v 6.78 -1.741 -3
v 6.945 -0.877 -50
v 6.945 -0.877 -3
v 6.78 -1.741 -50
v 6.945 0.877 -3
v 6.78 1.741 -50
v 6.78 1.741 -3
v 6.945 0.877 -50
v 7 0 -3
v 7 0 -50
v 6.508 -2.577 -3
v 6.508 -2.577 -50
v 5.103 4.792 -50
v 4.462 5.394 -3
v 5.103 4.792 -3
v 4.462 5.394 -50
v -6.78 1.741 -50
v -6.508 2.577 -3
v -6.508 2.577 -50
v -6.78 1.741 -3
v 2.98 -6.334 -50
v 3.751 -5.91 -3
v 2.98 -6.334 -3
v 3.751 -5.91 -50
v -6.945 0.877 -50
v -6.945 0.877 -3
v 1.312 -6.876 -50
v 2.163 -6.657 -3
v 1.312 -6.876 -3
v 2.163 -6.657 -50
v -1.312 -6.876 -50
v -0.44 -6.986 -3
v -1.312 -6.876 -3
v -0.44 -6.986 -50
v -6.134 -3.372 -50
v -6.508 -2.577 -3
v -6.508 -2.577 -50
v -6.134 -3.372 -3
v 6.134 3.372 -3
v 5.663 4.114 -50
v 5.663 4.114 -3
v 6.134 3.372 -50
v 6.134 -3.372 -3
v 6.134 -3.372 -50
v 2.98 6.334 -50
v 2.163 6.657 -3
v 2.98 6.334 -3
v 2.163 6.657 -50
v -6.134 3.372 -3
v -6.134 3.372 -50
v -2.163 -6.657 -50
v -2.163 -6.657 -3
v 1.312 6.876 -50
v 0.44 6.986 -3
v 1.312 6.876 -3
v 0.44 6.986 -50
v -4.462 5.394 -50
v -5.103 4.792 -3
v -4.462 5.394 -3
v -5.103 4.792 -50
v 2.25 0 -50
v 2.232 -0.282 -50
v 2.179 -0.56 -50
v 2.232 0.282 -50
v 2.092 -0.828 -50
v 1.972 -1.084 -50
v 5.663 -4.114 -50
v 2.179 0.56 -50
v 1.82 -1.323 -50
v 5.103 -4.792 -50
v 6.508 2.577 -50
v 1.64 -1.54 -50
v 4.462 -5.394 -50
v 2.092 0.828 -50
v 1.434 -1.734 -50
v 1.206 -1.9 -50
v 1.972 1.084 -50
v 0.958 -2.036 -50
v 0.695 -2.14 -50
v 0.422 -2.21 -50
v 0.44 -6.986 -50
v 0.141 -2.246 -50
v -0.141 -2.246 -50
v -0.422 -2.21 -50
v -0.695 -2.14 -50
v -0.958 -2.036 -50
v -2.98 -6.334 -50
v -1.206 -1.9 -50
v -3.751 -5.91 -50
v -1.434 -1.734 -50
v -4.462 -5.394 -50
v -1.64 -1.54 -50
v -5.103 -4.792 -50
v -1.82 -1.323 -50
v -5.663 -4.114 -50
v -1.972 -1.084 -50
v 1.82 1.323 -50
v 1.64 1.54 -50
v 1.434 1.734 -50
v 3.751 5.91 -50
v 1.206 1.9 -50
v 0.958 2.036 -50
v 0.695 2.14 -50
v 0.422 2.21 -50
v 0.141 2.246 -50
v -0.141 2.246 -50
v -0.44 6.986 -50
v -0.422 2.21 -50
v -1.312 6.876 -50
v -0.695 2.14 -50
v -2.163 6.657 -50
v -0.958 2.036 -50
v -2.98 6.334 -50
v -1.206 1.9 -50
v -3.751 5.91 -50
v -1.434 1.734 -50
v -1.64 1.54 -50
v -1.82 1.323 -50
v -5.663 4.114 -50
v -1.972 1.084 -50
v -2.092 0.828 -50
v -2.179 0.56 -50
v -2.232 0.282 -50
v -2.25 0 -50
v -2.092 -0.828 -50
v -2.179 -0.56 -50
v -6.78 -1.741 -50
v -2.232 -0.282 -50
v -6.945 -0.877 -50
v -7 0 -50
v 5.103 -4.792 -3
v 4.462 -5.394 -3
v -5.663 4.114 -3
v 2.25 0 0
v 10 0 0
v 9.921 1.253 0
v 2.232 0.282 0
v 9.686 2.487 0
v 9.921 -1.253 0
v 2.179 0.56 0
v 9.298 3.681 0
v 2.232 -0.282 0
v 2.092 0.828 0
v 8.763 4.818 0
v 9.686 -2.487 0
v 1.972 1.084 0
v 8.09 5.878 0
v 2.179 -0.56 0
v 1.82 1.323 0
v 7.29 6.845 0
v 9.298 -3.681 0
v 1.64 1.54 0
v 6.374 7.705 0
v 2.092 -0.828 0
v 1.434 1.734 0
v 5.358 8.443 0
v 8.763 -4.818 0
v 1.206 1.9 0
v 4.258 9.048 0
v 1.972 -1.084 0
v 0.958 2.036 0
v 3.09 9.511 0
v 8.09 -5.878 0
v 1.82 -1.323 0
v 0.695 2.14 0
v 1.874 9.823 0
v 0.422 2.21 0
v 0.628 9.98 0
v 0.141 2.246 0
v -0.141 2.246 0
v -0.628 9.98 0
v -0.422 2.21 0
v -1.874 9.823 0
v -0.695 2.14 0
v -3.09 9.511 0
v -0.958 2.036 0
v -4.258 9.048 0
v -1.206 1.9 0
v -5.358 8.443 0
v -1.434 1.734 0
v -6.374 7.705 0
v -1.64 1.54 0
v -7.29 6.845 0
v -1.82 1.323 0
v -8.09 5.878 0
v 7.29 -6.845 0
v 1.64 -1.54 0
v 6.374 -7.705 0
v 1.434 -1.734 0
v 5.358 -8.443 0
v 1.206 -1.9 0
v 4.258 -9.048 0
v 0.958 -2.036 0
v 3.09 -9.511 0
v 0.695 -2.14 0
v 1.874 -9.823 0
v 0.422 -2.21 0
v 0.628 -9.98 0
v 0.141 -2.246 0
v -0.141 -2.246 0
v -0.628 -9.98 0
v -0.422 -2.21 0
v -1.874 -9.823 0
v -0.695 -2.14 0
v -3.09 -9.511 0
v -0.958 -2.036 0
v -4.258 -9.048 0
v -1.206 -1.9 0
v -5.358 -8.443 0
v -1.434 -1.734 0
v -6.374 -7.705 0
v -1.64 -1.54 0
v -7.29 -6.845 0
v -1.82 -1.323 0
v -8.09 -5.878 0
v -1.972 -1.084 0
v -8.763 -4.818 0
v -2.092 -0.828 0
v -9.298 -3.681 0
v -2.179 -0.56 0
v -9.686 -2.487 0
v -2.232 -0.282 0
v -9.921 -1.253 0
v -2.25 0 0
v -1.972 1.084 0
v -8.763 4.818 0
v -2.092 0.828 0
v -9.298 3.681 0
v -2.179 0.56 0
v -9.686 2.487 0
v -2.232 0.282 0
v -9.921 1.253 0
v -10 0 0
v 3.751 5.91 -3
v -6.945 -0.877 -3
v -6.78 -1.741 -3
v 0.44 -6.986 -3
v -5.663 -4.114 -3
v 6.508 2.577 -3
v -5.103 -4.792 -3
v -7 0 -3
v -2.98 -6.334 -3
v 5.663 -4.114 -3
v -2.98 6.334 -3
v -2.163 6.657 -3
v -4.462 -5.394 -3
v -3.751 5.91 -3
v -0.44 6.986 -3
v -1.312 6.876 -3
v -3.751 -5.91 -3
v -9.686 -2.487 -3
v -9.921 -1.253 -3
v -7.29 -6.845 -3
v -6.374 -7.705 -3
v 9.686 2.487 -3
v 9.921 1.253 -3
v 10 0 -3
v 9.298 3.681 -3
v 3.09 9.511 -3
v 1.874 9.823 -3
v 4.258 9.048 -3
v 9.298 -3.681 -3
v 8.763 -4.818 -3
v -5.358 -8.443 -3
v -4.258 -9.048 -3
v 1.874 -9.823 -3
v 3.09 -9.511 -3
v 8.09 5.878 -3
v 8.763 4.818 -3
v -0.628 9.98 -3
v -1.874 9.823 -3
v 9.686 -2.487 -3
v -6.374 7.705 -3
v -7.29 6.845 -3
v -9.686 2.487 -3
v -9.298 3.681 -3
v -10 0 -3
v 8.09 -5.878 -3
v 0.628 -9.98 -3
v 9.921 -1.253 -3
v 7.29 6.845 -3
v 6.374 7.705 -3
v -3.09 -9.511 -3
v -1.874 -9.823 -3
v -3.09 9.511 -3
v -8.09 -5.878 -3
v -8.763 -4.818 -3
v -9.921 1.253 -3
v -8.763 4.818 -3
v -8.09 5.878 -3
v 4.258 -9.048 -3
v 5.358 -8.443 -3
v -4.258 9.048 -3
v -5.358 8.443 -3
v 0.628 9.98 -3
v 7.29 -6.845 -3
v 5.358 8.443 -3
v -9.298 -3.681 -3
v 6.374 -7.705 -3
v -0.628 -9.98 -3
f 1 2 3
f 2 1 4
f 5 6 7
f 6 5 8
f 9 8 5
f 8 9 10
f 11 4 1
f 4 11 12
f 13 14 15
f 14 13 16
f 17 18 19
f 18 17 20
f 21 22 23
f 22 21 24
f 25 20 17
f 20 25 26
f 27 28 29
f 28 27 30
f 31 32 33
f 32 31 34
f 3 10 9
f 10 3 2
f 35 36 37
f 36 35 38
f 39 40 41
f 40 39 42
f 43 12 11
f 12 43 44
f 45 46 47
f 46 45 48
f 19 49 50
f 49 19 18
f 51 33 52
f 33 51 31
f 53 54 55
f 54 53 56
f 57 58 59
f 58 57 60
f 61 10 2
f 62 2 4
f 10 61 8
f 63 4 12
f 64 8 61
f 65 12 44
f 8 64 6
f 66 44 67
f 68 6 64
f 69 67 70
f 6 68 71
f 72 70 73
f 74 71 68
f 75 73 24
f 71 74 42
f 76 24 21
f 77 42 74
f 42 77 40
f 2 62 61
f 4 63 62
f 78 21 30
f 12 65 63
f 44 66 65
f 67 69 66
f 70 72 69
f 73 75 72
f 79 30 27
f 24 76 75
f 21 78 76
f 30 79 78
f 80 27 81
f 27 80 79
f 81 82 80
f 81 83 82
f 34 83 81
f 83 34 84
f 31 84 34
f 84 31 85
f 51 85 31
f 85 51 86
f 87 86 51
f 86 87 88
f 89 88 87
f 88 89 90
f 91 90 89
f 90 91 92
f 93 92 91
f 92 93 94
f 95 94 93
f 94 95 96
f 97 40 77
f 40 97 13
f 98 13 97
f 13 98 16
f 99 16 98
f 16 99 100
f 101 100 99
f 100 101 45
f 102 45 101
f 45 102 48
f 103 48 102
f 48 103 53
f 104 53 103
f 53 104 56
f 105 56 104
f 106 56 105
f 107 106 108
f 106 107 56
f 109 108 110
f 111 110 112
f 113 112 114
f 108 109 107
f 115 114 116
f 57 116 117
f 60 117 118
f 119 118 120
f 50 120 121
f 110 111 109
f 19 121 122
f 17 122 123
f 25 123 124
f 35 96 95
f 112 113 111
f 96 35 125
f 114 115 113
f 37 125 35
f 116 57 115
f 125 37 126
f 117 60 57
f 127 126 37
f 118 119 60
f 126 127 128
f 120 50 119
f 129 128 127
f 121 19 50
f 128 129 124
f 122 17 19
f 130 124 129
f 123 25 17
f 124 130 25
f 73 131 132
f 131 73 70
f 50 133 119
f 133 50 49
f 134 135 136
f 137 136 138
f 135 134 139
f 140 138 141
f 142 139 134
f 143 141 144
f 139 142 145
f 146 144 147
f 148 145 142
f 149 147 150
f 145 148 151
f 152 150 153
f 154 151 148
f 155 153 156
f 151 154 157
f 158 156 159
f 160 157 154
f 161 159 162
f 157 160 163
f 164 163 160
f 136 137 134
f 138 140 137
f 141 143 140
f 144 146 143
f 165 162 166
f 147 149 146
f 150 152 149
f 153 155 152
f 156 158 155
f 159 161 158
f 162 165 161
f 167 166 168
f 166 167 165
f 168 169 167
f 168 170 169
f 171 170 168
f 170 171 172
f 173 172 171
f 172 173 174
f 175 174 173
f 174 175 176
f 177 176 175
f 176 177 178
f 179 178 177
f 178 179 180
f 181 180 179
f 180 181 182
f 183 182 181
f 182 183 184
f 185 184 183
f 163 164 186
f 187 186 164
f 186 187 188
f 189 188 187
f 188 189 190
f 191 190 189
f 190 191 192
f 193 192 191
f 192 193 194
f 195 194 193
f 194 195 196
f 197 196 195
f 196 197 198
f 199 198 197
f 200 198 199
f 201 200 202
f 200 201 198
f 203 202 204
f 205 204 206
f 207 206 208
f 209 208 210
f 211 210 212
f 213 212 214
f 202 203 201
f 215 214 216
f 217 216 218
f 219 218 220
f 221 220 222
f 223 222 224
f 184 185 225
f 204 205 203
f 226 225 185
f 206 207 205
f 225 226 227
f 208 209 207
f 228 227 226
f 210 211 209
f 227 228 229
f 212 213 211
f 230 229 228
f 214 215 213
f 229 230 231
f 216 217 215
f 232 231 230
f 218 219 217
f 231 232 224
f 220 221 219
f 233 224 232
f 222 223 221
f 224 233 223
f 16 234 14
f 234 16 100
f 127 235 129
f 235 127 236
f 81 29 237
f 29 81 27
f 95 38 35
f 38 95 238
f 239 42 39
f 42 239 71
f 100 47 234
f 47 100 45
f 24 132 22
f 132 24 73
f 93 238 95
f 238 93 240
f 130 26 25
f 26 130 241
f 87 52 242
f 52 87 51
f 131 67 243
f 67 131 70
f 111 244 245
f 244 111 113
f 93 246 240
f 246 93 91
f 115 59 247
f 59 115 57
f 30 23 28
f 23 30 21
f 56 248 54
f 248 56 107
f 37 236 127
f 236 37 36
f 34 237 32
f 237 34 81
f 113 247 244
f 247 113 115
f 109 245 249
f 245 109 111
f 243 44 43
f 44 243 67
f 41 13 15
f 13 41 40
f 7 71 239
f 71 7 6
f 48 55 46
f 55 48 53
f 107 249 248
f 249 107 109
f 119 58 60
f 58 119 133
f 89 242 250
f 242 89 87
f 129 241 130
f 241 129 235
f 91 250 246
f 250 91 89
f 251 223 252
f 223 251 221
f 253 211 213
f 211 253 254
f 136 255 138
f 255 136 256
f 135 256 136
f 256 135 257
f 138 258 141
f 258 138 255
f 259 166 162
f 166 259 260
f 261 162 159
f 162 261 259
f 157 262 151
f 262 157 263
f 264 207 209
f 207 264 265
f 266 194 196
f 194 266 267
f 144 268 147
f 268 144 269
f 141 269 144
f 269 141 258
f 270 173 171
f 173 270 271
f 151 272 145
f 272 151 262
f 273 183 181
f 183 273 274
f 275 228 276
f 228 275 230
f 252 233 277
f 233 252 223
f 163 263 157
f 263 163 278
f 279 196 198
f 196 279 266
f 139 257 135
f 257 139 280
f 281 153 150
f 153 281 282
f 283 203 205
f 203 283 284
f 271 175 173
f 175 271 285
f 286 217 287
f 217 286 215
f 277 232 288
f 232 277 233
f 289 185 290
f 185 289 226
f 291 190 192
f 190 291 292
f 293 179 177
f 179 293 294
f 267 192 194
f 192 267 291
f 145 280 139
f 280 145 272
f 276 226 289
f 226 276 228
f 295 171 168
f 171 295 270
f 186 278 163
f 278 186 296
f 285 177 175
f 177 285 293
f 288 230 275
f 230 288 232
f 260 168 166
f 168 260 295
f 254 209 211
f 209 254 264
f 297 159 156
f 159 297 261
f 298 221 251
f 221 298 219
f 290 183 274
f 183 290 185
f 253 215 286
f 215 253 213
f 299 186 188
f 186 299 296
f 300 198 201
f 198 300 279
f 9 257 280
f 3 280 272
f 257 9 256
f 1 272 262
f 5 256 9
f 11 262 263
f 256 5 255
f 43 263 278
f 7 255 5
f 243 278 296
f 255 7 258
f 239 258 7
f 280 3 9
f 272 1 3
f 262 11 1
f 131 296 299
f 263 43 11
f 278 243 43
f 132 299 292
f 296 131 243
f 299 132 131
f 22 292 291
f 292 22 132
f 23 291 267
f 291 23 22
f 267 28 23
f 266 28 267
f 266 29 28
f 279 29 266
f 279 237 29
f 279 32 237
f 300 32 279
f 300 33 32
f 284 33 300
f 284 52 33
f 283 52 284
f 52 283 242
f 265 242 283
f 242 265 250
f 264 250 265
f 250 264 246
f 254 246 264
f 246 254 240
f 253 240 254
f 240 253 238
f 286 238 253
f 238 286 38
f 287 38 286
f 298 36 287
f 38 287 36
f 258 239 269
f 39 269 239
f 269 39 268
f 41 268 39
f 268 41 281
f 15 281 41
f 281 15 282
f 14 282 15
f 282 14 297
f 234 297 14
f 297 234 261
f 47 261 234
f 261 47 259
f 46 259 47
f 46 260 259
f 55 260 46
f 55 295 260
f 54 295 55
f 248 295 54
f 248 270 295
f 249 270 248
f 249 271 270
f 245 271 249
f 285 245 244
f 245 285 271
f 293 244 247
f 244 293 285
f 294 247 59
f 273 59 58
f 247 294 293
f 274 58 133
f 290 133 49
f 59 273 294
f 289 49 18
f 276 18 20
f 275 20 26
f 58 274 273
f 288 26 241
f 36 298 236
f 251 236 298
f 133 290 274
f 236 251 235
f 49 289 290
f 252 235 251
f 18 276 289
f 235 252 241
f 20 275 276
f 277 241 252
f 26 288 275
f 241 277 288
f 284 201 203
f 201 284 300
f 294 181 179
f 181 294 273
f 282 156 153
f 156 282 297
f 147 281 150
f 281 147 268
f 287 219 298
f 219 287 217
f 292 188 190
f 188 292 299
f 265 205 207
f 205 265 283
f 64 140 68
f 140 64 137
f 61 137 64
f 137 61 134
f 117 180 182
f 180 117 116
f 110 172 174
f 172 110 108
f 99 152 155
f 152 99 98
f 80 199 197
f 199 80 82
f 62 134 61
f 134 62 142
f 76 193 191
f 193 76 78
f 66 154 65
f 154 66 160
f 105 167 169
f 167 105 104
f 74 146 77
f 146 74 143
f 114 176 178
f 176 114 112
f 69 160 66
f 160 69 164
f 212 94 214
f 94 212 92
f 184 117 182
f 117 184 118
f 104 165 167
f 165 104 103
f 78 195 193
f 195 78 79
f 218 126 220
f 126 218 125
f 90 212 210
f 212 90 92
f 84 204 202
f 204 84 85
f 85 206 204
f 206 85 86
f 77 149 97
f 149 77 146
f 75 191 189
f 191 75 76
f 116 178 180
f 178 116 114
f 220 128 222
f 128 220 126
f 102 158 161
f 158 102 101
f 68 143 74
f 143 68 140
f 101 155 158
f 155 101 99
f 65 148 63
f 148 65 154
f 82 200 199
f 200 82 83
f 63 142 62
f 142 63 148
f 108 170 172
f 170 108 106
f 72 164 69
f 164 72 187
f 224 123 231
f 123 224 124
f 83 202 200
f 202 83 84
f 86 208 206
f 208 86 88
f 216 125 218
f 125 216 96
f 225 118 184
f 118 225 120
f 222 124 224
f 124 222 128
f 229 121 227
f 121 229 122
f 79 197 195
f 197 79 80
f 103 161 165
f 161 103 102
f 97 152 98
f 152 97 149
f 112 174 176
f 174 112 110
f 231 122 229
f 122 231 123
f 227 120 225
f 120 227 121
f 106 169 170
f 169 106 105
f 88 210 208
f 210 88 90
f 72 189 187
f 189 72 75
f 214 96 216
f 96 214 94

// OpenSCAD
$fn = 50;


difference() {
	union() {
		translate(v = [0, 0, -50.0000000000]) {
			cylinder(h = 50, r = 7.0000000000);
		}
		translate(v = [0, 0, -3.0000000000]) {
			cylinder(h = 3, r = 10.0000000000);
		}
	}
	union() {
		#translate(v = [0, 0, -50]) {
			cylinder(h = 50, r = 2.2500000000);
		}
	}
}
